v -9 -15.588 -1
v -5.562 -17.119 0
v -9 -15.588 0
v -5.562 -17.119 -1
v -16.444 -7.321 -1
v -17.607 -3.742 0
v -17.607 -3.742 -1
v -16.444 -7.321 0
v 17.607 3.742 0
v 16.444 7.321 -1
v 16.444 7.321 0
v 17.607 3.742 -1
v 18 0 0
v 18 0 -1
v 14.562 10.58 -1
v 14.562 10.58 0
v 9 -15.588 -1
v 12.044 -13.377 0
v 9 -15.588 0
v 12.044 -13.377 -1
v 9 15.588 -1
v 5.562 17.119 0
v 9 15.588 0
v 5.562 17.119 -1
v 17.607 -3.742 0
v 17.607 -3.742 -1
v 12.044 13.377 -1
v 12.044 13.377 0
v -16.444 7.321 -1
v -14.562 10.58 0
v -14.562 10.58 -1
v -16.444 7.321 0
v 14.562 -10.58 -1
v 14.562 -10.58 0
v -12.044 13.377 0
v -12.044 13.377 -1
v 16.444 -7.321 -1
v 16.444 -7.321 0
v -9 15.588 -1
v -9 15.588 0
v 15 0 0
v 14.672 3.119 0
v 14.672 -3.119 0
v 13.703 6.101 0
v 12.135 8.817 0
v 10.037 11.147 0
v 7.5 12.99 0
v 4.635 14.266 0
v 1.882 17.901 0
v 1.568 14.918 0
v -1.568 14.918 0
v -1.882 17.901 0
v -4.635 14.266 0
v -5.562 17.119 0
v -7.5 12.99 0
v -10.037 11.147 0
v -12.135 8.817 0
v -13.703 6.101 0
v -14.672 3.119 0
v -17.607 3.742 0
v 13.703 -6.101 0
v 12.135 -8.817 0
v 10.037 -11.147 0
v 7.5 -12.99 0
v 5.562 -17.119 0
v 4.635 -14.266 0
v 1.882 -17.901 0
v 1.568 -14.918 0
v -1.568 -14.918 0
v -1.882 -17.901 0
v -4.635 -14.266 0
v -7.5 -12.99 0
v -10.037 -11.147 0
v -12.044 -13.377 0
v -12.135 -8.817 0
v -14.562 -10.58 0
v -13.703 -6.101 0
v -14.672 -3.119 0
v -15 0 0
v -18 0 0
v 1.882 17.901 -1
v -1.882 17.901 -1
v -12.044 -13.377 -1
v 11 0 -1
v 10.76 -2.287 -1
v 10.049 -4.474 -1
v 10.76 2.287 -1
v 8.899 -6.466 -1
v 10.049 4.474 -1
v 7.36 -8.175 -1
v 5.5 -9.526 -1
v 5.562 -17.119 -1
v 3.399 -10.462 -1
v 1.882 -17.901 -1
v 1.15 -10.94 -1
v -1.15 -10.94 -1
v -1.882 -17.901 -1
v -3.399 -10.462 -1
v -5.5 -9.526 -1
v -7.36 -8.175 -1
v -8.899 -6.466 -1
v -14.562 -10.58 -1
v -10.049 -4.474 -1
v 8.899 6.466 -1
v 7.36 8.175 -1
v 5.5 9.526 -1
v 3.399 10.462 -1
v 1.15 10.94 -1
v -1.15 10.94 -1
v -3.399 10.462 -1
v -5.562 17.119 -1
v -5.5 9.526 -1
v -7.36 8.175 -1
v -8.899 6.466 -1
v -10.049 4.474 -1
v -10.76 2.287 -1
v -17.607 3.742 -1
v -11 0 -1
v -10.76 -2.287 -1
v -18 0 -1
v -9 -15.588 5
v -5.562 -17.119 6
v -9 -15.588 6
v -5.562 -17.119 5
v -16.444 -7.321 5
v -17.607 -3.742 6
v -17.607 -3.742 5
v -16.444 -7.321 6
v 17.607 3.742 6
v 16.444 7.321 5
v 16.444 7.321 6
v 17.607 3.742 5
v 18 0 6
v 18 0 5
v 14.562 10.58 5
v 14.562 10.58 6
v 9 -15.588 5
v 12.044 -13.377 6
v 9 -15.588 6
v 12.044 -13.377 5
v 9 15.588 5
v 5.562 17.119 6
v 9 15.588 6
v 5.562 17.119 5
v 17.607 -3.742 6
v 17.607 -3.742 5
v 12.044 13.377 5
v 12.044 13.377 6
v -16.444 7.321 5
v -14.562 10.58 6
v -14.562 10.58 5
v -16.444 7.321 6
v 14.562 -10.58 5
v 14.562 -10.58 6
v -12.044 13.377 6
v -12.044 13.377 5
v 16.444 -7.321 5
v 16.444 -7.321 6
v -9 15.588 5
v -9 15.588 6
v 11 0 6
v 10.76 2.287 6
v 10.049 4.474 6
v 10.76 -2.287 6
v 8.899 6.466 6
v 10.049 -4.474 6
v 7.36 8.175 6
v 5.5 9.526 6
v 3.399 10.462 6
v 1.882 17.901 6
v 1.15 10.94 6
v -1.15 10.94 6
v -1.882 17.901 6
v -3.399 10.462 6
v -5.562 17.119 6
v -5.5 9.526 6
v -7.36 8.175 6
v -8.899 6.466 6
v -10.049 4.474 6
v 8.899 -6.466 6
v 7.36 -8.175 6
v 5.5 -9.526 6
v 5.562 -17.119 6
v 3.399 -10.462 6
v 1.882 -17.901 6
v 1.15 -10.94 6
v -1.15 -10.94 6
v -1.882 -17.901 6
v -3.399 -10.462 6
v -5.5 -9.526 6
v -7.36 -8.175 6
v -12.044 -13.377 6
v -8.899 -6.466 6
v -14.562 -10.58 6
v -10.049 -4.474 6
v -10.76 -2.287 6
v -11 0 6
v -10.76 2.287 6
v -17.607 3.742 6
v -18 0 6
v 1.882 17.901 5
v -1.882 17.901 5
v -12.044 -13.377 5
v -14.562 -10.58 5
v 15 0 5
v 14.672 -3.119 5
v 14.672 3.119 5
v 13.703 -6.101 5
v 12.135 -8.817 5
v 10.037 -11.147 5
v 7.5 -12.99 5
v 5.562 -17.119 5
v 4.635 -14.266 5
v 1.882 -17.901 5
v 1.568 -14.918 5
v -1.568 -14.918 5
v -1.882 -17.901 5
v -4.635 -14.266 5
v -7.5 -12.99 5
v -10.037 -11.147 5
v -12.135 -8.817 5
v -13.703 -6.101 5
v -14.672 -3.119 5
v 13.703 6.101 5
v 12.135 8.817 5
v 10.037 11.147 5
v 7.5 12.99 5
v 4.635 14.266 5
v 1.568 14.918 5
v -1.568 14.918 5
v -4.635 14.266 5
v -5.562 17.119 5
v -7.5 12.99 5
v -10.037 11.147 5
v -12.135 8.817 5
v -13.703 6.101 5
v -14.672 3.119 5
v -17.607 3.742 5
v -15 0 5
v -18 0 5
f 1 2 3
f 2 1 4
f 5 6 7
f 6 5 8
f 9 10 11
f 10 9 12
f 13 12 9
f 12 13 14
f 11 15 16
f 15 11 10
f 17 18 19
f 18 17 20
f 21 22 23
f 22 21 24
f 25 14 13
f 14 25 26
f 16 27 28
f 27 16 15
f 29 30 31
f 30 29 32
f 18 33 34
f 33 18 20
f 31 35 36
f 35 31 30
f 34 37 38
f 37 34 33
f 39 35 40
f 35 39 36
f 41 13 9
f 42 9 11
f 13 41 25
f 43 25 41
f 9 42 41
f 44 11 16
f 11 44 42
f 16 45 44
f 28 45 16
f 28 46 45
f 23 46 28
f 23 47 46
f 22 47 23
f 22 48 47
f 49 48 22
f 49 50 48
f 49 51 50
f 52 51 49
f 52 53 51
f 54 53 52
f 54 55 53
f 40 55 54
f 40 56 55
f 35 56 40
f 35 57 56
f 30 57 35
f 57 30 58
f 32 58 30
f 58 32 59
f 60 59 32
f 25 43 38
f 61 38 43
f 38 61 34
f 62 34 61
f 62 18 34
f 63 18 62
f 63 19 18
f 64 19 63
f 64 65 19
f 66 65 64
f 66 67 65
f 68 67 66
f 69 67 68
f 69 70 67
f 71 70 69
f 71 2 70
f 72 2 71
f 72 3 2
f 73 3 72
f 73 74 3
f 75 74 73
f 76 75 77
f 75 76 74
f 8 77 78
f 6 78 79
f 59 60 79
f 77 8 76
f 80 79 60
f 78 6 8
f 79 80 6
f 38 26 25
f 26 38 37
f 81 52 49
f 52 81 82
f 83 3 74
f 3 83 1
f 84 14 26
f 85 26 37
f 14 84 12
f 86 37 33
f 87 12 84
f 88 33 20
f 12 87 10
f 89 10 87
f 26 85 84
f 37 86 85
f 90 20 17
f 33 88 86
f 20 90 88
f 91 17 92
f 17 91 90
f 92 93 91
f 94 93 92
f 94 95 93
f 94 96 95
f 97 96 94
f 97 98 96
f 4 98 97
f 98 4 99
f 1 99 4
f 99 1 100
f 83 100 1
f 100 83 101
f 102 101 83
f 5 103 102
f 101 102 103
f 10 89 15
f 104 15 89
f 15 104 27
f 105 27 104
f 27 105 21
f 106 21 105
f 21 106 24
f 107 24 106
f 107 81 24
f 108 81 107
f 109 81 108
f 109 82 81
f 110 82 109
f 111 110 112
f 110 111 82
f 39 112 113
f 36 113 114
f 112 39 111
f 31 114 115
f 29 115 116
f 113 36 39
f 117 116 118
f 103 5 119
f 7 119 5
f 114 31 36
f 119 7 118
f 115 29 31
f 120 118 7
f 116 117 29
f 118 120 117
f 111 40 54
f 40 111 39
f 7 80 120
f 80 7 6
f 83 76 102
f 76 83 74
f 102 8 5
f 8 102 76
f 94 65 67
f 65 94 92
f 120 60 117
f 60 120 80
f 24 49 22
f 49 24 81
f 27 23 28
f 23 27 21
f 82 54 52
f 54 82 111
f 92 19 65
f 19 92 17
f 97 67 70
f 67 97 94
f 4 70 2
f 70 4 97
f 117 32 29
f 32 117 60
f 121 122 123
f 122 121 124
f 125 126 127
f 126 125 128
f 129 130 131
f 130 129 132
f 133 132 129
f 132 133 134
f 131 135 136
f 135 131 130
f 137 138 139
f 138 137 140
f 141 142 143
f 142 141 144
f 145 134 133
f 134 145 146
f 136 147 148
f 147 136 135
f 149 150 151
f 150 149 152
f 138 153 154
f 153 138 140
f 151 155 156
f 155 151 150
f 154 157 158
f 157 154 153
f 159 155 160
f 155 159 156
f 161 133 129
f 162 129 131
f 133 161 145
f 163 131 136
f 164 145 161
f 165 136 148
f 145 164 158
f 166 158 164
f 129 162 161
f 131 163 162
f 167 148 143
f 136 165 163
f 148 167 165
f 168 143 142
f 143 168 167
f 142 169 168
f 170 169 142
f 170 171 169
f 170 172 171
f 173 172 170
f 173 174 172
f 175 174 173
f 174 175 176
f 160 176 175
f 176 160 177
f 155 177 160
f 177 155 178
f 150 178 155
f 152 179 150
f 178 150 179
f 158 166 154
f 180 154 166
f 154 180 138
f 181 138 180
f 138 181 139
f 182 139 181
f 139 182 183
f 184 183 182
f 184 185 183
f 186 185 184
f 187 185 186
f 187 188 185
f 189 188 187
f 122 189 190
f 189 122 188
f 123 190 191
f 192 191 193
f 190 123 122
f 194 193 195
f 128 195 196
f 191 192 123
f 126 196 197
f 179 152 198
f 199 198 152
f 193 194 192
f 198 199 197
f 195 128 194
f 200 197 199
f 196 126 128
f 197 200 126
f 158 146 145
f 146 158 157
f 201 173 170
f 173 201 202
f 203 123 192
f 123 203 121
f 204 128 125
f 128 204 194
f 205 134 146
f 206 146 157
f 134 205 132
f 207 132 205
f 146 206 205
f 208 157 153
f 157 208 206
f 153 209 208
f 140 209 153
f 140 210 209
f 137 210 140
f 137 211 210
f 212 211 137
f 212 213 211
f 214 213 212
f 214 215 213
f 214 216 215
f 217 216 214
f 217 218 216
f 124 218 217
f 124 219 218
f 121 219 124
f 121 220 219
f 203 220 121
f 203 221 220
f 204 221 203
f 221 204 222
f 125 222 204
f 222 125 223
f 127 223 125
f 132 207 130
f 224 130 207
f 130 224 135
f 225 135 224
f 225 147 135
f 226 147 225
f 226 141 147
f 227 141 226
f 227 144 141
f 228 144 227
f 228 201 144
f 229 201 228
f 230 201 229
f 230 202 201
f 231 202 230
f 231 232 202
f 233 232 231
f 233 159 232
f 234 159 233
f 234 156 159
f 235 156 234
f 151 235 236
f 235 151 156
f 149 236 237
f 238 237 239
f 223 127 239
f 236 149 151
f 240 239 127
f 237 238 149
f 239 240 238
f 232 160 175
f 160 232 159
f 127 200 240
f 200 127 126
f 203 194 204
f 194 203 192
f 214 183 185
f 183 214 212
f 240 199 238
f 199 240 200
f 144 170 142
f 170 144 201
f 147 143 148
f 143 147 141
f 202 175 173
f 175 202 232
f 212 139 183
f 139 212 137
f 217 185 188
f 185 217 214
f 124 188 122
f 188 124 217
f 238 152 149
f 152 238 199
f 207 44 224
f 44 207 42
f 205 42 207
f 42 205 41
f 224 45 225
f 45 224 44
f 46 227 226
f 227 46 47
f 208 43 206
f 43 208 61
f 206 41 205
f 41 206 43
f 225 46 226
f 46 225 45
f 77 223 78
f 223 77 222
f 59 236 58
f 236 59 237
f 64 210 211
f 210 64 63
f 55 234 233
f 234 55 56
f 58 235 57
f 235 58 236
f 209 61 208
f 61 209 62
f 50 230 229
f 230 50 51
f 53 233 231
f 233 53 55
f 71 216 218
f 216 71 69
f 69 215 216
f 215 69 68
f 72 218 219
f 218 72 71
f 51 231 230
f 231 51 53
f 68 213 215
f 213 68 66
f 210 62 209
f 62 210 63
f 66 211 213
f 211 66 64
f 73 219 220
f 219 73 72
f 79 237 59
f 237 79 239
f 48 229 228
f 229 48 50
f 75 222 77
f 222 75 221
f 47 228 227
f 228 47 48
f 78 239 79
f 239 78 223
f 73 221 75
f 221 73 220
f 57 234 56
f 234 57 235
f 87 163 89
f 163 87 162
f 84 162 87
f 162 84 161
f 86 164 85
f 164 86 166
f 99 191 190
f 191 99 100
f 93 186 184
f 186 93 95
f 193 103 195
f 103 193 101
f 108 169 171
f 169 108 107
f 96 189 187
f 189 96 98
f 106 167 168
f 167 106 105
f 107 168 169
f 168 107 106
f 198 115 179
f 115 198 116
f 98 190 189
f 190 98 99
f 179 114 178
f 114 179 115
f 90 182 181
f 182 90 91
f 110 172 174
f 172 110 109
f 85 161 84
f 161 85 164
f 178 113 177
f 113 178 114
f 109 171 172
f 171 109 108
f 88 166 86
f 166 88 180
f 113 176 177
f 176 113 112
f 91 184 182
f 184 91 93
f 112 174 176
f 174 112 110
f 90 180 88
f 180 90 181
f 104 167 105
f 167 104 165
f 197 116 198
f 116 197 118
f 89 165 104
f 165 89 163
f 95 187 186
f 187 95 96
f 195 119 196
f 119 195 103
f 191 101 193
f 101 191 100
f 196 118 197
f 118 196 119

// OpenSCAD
// How big you want your coiler to be
cylinderRadius = 15;

module outer() {
	translate([0, 0, -1]) cylinder(r = cylinderRadius + 3, h = 1);
	translate([0, 0, 5]) cylinder(r = cylinderRadius + 3, h = 1);
}

module inner() {
	cylinder(r = cylinderRadius, h = 5);
}

difference() {
	union() {
		outer();
		inner();
	}
	translate([0, 0, -3]) cylinder(r = cylinderRadius - 4, h = 10);
}
